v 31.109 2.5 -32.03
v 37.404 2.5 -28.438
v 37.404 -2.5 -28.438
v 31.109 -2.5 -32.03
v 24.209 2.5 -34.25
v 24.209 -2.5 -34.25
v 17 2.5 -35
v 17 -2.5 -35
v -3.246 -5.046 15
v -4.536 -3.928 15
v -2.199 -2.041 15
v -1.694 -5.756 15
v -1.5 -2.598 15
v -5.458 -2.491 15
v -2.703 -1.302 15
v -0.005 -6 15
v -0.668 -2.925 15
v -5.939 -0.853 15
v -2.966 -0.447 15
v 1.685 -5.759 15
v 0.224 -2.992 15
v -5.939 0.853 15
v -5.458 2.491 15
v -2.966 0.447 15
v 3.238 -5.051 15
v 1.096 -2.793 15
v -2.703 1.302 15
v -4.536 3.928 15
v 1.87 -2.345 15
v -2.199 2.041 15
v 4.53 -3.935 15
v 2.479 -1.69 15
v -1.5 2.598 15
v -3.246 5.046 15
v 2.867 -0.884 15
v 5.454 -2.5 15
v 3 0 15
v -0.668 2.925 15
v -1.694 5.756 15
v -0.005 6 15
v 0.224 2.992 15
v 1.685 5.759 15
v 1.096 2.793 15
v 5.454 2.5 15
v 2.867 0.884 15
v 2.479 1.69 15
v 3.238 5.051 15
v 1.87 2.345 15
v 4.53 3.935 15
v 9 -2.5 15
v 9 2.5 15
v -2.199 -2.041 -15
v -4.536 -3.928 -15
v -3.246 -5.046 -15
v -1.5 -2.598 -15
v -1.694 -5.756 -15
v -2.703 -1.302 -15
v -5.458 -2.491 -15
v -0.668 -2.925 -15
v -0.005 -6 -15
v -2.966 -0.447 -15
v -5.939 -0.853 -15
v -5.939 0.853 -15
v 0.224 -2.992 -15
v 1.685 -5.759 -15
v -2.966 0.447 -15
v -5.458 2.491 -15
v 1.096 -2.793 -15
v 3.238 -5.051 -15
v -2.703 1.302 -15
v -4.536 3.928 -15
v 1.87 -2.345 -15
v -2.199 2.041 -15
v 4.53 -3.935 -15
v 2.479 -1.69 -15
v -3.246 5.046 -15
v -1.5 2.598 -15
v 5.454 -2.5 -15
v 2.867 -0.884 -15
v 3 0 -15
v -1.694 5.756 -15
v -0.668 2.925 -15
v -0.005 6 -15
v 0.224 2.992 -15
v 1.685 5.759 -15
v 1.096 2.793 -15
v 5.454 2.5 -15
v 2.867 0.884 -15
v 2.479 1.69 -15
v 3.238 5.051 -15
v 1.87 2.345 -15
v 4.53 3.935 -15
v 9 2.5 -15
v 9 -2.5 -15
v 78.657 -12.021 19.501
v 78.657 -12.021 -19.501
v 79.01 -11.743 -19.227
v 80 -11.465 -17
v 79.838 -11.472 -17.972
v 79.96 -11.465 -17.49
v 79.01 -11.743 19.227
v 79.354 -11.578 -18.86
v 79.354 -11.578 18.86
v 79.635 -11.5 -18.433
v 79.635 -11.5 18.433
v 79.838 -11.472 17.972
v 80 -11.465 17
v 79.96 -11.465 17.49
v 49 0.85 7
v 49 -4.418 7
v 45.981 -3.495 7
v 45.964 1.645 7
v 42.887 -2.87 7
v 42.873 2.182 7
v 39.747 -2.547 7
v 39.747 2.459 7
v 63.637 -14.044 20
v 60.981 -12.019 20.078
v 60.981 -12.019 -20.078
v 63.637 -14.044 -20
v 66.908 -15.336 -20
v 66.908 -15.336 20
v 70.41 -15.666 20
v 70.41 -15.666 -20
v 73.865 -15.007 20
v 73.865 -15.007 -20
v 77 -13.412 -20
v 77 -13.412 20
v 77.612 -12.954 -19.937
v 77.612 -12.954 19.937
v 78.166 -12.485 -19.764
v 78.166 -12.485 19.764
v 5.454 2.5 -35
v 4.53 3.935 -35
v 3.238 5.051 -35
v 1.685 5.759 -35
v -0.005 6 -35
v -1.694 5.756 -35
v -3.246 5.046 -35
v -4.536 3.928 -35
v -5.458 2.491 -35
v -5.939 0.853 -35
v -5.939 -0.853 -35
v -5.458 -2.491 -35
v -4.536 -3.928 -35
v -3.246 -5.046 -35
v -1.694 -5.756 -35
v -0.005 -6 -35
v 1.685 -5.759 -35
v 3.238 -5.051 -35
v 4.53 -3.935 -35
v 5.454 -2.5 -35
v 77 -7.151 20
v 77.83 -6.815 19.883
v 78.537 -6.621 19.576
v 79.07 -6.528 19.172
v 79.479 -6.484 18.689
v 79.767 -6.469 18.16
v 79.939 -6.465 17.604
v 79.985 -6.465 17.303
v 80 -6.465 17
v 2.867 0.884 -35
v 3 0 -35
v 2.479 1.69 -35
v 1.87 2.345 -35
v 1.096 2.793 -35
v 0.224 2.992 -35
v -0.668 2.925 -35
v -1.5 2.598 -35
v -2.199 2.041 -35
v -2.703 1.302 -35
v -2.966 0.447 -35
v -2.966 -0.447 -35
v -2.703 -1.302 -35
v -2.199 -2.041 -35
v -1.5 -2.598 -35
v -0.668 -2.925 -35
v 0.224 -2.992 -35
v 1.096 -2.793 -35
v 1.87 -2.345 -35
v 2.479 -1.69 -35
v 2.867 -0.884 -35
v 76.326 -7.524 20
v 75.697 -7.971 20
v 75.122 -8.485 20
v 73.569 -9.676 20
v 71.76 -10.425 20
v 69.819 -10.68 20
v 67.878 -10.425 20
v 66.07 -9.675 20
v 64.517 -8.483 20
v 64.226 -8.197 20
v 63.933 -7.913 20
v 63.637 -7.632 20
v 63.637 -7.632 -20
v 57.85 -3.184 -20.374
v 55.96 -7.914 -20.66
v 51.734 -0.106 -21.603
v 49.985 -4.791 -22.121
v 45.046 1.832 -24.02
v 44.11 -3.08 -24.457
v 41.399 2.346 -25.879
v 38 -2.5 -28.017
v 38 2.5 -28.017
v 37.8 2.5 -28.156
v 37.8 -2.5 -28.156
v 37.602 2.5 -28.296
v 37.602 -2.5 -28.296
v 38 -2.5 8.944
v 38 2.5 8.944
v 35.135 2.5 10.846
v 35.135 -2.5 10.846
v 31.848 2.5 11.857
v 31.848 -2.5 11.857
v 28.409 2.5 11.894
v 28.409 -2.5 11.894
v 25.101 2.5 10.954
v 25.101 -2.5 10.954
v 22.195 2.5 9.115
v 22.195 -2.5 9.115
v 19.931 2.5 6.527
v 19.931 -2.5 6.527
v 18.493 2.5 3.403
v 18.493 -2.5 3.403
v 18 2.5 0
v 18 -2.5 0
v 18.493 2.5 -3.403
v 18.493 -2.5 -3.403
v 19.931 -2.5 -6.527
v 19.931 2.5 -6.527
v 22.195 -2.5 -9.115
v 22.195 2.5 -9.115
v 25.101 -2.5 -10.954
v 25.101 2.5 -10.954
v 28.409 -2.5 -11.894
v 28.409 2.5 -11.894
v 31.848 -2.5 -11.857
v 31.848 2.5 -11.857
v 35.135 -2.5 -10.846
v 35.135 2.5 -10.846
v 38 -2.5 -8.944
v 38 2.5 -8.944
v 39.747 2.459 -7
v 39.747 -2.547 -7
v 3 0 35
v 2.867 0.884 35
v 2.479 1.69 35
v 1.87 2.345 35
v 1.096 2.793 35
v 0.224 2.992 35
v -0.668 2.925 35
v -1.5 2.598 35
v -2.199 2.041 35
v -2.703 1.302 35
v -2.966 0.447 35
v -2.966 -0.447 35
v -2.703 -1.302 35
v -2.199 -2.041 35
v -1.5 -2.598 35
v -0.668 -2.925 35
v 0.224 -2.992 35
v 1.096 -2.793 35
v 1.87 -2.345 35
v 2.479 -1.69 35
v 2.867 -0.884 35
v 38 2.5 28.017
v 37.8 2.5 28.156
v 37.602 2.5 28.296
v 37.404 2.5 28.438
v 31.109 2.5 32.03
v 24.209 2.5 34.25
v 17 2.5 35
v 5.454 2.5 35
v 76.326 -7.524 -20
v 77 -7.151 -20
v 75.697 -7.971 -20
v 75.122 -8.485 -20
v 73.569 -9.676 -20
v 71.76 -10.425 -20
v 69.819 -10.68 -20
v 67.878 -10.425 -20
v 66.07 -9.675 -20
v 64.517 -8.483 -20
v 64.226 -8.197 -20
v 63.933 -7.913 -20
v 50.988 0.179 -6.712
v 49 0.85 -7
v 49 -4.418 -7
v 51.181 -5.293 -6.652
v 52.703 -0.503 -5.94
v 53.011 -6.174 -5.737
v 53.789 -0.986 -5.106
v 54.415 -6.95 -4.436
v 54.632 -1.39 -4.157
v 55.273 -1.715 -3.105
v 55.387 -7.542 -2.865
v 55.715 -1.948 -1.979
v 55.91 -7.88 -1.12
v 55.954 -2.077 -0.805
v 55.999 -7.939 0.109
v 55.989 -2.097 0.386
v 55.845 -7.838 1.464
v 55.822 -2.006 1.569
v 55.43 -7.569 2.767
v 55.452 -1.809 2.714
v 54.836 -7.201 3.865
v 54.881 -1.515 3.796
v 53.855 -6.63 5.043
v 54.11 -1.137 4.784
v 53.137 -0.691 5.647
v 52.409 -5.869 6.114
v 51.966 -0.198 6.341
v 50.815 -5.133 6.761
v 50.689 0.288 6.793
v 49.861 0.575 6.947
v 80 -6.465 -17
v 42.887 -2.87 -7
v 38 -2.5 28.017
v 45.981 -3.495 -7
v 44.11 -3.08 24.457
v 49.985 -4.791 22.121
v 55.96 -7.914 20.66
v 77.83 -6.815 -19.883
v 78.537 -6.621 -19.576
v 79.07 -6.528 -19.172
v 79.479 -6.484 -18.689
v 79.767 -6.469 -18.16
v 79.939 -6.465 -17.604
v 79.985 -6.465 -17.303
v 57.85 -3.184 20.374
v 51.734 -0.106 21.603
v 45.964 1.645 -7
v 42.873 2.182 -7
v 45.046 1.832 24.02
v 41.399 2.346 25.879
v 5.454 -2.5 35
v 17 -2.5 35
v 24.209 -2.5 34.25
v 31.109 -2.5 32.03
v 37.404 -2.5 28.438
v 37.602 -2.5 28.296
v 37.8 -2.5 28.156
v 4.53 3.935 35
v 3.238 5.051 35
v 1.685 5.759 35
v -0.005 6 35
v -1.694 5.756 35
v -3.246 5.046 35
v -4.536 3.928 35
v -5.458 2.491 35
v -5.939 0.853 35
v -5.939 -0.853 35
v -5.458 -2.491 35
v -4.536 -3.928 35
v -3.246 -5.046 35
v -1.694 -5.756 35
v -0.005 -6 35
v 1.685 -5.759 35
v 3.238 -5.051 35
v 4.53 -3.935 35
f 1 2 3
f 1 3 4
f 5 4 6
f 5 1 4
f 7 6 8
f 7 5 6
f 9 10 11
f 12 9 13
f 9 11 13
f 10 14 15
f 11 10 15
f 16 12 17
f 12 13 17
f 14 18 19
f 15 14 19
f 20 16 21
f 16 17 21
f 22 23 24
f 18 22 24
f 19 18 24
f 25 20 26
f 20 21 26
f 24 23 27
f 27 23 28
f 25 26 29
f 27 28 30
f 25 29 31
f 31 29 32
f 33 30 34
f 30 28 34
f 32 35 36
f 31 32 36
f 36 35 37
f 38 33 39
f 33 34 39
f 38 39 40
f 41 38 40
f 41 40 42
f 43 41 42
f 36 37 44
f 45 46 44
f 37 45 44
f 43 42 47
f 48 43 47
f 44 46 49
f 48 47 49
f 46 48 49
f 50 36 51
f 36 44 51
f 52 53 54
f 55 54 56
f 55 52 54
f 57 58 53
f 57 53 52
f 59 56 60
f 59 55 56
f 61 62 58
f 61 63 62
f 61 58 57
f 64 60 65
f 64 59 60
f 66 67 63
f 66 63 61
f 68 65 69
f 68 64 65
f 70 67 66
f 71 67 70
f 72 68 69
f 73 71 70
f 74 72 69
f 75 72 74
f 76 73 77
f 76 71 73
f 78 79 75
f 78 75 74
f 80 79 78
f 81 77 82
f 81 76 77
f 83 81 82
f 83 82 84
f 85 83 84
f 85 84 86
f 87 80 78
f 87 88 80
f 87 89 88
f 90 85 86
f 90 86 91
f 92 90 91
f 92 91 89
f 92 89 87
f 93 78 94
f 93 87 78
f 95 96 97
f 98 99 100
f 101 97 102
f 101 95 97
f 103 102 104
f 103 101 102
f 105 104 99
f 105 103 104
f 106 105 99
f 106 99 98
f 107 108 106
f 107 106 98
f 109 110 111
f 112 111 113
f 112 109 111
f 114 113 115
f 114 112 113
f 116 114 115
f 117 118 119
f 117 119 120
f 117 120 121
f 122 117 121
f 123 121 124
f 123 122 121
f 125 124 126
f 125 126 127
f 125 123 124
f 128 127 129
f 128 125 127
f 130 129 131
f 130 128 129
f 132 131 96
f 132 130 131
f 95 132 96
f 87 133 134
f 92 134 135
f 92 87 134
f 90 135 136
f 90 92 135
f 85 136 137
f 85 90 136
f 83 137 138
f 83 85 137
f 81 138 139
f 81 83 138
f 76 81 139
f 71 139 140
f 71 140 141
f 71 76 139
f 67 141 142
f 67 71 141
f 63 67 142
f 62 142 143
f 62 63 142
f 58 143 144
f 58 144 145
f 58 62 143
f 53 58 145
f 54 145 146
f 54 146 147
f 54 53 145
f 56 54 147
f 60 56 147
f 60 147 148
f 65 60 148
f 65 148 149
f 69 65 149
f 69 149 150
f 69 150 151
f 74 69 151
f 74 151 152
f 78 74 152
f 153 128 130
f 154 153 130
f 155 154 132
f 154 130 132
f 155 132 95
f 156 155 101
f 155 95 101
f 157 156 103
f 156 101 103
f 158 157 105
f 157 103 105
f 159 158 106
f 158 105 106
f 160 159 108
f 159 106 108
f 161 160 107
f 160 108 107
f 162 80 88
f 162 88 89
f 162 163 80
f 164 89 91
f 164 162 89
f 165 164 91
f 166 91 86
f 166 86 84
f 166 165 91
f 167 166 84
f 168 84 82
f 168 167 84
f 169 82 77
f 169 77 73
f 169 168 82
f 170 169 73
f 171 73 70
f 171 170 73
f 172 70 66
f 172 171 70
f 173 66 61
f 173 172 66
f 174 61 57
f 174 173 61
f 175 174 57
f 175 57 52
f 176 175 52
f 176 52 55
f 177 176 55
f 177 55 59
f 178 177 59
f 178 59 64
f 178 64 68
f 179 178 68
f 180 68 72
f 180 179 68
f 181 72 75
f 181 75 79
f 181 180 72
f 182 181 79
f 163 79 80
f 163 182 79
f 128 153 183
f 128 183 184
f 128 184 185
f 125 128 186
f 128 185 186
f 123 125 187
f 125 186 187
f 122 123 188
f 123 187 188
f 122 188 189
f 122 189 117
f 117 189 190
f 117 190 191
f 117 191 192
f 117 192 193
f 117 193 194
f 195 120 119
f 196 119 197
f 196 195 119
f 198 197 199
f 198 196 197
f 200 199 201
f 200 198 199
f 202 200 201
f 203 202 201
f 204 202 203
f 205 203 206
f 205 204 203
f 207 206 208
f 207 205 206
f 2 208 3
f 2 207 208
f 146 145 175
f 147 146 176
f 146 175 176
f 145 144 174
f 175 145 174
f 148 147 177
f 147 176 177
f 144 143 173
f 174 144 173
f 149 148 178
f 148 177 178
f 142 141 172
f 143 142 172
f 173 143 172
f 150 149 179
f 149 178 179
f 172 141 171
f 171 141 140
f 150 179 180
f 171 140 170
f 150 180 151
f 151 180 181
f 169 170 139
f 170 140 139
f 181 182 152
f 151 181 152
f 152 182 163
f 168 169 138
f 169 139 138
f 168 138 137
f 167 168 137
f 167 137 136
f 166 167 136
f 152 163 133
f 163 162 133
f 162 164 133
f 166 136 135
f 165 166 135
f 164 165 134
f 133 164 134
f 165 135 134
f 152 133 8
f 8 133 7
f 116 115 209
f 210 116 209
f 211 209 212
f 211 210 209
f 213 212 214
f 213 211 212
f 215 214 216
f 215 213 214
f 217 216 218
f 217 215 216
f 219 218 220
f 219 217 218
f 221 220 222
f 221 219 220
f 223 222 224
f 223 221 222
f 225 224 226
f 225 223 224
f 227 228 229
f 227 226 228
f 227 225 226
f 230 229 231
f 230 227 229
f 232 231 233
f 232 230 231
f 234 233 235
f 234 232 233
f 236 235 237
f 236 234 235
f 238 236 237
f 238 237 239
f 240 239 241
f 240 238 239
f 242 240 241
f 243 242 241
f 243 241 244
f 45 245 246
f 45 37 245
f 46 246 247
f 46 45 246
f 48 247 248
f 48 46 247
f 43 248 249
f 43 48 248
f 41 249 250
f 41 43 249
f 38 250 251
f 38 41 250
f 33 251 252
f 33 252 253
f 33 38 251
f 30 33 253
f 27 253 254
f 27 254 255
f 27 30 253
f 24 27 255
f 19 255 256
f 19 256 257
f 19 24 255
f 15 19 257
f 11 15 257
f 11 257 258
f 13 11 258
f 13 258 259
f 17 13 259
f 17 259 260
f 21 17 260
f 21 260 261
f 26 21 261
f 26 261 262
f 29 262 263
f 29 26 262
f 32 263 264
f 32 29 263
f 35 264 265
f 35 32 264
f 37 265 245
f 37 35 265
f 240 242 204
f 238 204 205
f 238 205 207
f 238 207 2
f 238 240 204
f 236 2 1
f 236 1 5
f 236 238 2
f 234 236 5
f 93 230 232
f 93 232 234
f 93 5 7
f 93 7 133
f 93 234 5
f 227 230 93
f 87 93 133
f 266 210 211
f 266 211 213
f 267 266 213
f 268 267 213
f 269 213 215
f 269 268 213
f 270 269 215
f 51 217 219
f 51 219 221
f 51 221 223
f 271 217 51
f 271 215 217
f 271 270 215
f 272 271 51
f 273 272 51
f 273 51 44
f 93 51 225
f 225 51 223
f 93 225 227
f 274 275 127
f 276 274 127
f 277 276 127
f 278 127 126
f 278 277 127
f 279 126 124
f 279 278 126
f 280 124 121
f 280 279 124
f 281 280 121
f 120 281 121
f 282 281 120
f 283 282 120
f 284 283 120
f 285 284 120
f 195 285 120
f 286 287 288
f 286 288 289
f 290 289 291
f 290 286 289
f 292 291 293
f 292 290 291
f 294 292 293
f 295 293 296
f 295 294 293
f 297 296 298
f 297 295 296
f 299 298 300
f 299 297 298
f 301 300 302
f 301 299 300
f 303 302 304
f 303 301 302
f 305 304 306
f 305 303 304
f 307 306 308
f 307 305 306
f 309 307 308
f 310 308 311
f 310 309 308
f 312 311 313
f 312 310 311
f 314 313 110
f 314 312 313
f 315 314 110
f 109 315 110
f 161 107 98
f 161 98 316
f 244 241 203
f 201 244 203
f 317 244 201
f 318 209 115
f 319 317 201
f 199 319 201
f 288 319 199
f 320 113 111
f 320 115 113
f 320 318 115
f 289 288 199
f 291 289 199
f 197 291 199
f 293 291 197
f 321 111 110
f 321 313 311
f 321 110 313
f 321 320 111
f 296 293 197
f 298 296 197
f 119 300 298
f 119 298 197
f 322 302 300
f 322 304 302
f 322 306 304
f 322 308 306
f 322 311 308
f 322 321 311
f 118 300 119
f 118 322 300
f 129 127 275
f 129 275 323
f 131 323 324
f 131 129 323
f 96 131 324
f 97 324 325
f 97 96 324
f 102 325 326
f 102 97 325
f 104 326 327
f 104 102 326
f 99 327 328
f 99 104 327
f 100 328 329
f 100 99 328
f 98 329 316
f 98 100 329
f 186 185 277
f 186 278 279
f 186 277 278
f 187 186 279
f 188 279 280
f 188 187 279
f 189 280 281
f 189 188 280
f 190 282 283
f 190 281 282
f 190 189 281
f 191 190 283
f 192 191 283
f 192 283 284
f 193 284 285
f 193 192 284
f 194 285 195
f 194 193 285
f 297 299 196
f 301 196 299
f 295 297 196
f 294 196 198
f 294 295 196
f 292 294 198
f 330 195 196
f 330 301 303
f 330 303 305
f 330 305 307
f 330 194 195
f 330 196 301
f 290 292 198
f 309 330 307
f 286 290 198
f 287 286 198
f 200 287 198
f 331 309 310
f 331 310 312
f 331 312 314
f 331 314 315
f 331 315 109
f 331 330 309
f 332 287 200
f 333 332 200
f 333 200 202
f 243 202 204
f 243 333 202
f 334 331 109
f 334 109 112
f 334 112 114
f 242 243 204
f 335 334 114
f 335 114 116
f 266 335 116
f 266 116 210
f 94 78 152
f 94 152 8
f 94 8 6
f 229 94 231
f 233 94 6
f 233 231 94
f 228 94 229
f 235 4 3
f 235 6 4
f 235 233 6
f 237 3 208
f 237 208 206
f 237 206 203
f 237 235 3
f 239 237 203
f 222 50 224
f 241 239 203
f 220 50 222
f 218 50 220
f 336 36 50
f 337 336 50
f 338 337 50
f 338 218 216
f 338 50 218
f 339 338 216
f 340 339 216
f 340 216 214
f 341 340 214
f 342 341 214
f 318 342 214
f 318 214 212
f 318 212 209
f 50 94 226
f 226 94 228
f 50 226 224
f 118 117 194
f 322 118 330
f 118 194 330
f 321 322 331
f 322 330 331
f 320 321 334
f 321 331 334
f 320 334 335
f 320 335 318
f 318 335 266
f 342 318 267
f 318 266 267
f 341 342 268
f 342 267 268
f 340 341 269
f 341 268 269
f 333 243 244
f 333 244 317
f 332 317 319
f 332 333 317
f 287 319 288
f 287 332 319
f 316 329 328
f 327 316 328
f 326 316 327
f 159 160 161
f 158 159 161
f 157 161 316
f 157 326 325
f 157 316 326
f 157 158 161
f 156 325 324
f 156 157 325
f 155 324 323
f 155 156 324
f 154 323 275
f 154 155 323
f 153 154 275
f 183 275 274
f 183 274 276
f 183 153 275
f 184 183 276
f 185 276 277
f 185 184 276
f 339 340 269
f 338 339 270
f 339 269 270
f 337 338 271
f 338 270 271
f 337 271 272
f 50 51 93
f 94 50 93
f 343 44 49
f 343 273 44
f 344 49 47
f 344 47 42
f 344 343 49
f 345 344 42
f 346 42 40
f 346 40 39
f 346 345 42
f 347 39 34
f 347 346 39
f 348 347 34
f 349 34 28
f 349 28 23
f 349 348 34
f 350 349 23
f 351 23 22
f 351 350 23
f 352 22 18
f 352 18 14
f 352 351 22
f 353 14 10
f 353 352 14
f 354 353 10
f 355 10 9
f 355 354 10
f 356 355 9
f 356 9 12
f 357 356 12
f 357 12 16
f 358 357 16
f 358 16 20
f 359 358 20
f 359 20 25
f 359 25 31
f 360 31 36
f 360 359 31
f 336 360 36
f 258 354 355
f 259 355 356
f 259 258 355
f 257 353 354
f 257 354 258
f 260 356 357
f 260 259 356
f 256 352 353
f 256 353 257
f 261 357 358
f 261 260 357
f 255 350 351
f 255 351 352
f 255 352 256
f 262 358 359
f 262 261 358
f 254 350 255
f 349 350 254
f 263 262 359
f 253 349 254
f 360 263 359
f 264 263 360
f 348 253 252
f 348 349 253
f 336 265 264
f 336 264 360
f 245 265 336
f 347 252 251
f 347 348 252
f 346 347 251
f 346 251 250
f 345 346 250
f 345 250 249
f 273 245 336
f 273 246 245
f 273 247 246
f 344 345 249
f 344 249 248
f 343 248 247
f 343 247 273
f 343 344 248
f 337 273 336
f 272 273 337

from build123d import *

# Parameters (mm, degrees)
SKETCH1_R               = 3
BOSS_EXTRUDE1_DEPTH     = 35
SKETCH2_W               = 15
SKETCH2_H               = 30
CUT_EXTRUDE2_DEPTH      = 4.5
CUT_EXTRUDE2_DEPTH_BACK = 19.180194847
CUT_EXTRUDE3_DEPTH      = 4.5
CUT_EXTRUDE3_DEPTH_BACK = 19.180194847
CUT_EXTRUDE5_DEPTH      = 4.5
CUT_EXTRUDE5_DEPTH_BACK = 19.180194847
FILLET2_R               = 3


with BuildPart() as part:
    # Sketch1 → Boss-Extrude1 (new body, symmetric)
    with BuildSketch(Plane.XY):
        with BuildLine():
            Line((6, -2.5), (38, -2.5))
            ThreePointArc((38, -2.5), (50.437211552, -4.973915193), (60.980970389, -12.019029611))
            ThreePointArc((60.980970389, -12.019029611), (69.818490023, -15.680194777), (78.656779847, -12.020889292))
            ThreePointArc((78.656779847, -12.020889292), (79.273086166, -11.609227247), (80, -11.464674847))
            Line((80, -11.464674847), (80, -6.464674847))
            ThreePointArc((80, -6.464674847), (77.360155024, -6.989628298), (75.121989969, -8.484611514))
            ThreePointArc((75.121989969, -8.484611514), (69.819016075, -10.680194805), (64.516504294, -8.483495706))
            ThreePointArc((64.516504294, -8.483495706), (52.350628714, -0.354517531), (38, 2.5))
            Line((38, 2.5), (6, 2.5))
            Line((6, 2.5), (5.454356057, 2.5))
            ThreePointArc((5.454356057, 2.5), (-6, 0), (5.454356057, -2.5))
            Line((5.454356057, -2.5), (6, -2.5))
        make_face()
        Circle(SKETCH1_R, mode=Mode.SUBTRACT)
    extrude(amount=BOSS_EXTRUDE1_DEPTH, both=True)

    # Sketch2 → Cut-Extrude2 (cut, two sides)
    with BuildSketch(Plane(origin=(0, 2.5, 0), x_dir=(1, 0, 0), z_dir=(0, 1, 0))) as cut_extrude2_sk:
        with Locations((1.5, 0)):
            Rectangle(SKETCH2_W, SKETCH2_H)
    extrude(amount=CUT_EXTRUDE2_DEPTH, mode=Mode.SUBTRACT)
    extrude(cut_extrude2_sk.sketch, amount=-CUT_EXTRUDE2_DEPTH_BACK, mode=Mode.SUBTRACT)

    # Sketch3 → Cut-Extrude3 (cut, two sides)
    with BuildSketch(Plane(origin=(0, 2.5, 0), x_dir=(1, 0, 0), z_dir=(0, 1, 0))) as cut_extrude3_sk:
        with BuildLine():
            Line((39.746794345, 7), (49, 7))
            ThreePointArc((49, 7), (56, 0), (49, -7))
            Line((49, -7), (39.746794345, -7))
            ThreePointArc((39.746794345, -7), (18, 0), (39.746794345, 7))
        make_face()
    extrude(amount=CUT_EXTRUDE3_DEPTH, mode=Mode.SUBTRACT)
    extrude(cut_extrude3_sk.sketch, amount=-CUT_EXTRUDE3_DEPTH_BACK, mode=Mode.SUBTRACT)

    # Sketch4 → Cut-Extrude5 (cut, two sides)
    with BuildSketch(Plane(origin=(0, 2.5, 0), x_dir=(1, 0, 0), z_dir=(0, 1, 0))) as cut_extrude5_sk:
        with BuildLine():
            Line((80, -20), (63.636895265, -20))
            ThreePointArc((63.636895265, -20), (49.858515462, -22.16127628), (37.403641679, -28.4375))
            ThreePointArc((37.403641679, -28.4375), (27.716517625, -33.319007338), (17, -35))
            Line((17, -35), (80, -35))
            Line((80, -35), (80, -20))
        make_face()
        with BuildLine():
            Line((80, 20), (63.636895265, 20))
            ThreePointArc((63.636895265, 20), (49.858515462, 22.16127628), (37.403641679, 28.4375))
            ThreePointArc((37.403641679, 28.4375), (27.716517625, 33.319007338), (17, 35))
            Line((17, 35), (80, 35))
            Line((80, 35), (80, 20))
        make_face()
    extrude(amount=CUT_EXTRUDE5_DEPTH, mode=Mode.SUBTRACT)
    extrude(cut_extrude5_sk.sketch, amount=-CUT_EXTRUDE5_DEPTH_BACK, mode=Mode.SUBTRACT)

    # Fillet2
    fillet2_edges = [part.edges().sort_by_distance(p)[0] for p in [
        (80, -8.964674847, -20),
        (80, -8.964674847, 20),
    ]]
    fillet(fillet2_edges, radius=FILLET2_R)


solid = part.part
